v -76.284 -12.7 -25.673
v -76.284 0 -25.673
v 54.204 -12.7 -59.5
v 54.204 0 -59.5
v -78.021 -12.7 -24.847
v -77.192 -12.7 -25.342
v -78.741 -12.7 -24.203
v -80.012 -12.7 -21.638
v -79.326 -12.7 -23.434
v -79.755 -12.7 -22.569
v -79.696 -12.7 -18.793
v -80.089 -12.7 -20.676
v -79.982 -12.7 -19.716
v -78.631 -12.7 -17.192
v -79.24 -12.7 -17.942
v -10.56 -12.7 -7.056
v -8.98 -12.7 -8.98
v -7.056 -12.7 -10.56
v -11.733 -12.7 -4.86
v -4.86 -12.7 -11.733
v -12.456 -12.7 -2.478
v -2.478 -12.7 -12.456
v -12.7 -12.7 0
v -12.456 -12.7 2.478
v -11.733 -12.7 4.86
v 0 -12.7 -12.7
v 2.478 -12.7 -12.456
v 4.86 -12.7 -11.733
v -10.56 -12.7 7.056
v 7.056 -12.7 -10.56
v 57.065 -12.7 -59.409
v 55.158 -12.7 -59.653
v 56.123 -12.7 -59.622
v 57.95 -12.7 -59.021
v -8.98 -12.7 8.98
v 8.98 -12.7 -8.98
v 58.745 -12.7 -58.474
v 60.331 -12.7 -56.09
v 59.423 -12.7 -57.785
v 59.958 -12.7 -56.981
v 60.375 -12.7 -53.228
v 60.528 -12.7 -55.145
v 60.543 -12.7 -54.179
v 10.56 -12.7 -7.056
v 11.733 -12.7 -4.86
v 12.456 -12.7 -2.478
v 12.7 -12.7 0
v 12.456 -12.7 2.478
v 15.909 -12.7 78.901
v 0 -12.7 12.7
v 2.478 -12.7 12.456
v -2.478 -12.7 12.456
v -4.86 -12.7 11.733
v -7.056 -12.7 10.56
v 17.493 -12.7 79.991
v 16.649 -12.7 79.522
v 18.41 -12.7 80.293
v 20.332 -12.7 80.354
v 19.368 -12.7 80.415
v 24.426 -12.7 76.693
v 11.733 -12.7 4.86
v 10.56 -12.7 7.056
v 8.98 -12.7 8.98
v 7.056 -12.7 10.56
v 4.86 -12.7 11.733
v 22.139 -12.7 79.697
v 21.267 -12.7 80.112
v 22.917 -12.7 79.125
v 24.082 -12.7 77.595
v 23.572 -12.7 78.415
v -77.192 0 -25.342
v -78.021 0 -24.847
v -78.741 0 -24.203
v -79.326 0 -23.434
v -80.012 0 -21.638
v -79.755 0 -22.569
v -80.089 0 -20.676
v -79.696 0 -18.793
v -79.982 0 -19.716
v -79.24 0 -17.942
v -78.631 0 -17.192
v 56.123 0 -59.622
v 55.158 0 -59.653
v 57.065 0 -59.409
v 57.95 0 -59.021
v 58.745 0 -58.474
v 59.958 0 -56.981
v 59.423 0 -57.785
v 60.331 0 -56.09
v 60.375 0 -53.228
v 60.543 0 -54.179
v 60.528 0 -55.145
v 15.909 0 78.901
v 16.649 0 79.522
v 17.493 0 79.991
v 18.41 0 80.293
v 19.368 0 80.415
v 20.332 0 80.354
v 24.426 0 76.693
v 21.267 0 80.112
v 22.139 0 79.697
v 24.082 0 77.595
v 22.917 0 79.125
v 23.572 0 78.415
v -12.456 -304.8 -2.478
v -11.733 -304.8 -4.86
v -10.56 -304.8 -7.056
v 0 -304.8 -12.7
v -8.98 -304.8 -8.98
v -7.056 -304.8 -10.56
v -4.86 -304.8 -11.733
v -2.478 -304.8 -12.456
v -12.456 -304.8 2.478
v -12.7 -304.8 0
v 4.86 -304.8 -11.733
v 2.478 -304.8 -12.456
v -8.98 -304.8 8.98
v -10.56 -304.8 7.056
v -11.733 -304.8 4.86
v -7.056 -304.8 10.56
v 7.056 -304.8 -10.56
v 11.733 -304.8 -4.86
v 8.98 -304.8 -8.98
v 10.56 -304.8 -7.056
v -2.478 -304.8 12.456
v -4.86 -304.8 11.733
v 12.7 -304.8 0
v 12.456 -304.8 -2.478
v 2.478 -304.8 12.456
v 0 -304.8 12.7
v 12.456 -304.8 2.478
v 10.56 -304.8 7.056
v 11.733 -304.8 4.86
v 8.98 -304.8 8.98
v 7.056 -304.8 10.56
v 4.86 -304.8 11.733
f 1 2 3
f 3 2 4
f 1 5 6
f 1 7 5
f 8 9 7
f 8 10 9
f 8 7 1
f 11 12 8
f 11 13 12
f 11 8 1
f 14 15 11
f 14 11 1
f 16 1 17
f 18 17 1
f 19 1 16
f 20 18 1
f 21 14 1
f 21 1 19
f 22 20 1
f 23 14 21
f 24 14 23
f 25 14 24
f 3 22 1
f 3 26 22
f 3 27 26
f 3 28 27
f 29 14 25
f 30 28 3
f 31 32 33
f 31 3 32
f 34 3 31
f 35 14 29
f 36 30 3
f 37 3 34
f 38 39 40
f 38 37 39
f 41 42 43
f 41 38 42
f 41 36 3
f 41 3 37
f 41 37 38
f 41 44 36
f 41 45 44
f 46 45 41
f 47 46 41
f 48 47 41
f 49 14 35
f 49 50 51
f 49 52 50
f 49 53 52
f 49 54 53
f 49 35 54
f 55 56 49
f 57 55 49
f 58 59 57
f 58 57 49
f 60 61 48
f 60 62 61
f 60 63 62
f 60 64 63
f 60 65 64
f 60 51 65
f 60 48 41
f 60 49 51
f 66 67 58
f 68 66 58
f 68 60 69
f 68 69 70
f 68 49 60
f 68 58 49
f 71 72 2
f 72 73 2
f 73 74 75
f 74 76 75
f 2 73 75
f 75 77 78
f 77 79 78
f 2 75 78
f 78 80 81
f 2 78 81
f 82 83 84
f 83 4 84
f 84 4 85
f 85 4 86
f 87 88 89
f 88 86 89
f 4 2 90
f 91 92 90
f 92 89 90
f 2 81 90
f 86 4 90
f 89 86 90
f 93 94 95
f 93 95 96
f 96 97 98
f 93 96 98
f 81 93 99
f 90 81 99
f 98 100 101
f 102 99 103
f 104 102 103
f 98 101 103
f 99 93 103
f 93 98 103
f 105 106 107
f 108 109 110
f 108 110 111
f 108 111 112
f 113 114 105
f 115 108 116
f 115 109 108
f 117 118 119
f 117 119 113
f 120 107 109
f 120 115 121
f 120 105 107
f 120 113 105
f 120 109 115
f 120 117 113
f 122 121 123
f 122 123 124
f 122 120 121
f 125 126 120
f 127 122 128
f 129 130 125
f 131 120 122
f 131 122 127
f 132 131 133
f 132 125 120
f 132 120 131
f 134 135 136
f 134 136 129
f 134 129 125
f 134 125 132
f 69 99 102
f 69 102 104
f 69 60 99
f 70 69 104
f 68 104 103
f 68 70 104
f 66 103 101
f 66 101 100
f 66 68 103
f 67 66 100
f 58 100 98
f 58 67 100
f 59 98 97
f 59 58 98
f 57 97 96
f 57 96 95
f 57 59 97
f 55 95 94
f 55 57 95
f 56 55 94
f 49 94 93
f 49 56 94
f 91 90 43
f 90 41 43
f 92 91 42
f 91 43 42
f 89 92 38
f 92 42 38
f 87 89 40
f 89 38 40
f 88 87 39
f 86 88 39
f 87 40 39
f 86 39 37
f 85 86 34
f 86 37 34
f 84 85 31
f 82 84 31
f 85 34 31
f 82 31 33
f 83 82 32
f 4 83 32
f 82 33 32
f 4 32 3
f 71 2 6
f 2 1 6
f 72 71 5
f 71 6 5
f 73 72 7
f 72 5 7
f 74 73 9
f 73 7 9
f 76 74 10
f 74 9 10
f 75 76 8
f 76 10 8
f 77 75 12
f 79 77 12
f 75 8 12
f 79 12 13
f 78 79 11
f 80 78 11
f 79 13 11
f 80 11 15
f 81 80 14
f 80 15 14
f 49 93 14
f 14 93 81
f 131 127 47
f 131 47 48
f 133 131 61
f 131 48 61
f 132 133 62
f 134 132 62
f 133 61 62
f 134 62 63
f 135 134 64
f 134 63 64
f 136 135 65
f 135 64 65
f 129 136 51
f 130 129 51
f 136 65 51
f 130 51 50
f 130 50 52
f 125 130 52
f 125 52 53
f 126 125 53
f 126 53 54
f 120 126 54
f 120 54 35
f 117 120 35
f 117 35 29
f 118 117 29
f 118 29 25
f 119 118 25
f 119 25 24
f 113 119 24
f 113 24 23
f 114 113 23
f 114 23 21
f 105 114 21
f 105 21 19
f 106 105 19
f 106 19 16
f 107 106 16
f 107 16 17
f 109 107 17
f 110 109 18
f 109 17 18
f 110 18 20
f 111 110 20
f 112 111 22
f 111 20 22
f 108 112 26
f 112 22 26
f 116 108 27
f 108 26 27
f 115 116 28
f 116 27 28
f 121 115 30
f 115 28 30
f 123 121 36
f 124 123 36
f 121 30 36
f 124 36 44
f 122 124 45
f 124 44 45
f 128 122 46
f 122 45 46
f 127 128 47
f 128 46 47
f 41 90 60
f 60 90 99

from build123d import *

# Parameters (mm, degrees)
F0_R     = 12.7
F1_DEPTH = 304.8
F2_DEPTH = 12.7
F3_R     = 5.08


with BuildPart() as f1:
    # F0 (on Front) → F1 (new body)
    with BuildSketch(Plane.XZ):
        Circle(F0_R)
    extrude(amount=F1_DEPTH)

    # F0 (on Front) → F2 (join)
    with BuildSketch(Plane.XZ):
        Polygon((62.721773, -61.708178), (22.079963, 85.172738), (-84.801736, -23.46456), align=None)
        Circle(F0_R, mode=Mode.SUBTRACT)
    extrude(amount=F2_DEPTH)

    # F3
    f3_edges = [f1.edges().sort_by_distance(p)[0] for p in [
        (-84.801736, -6.35, -23.46456),
        (22.079963, -6.35, 85.172738),
        (62.721773, -6.35, -61.708178),
    ]]
    fillet(f3_edges, radius=F3_R)


solid = f1.part
